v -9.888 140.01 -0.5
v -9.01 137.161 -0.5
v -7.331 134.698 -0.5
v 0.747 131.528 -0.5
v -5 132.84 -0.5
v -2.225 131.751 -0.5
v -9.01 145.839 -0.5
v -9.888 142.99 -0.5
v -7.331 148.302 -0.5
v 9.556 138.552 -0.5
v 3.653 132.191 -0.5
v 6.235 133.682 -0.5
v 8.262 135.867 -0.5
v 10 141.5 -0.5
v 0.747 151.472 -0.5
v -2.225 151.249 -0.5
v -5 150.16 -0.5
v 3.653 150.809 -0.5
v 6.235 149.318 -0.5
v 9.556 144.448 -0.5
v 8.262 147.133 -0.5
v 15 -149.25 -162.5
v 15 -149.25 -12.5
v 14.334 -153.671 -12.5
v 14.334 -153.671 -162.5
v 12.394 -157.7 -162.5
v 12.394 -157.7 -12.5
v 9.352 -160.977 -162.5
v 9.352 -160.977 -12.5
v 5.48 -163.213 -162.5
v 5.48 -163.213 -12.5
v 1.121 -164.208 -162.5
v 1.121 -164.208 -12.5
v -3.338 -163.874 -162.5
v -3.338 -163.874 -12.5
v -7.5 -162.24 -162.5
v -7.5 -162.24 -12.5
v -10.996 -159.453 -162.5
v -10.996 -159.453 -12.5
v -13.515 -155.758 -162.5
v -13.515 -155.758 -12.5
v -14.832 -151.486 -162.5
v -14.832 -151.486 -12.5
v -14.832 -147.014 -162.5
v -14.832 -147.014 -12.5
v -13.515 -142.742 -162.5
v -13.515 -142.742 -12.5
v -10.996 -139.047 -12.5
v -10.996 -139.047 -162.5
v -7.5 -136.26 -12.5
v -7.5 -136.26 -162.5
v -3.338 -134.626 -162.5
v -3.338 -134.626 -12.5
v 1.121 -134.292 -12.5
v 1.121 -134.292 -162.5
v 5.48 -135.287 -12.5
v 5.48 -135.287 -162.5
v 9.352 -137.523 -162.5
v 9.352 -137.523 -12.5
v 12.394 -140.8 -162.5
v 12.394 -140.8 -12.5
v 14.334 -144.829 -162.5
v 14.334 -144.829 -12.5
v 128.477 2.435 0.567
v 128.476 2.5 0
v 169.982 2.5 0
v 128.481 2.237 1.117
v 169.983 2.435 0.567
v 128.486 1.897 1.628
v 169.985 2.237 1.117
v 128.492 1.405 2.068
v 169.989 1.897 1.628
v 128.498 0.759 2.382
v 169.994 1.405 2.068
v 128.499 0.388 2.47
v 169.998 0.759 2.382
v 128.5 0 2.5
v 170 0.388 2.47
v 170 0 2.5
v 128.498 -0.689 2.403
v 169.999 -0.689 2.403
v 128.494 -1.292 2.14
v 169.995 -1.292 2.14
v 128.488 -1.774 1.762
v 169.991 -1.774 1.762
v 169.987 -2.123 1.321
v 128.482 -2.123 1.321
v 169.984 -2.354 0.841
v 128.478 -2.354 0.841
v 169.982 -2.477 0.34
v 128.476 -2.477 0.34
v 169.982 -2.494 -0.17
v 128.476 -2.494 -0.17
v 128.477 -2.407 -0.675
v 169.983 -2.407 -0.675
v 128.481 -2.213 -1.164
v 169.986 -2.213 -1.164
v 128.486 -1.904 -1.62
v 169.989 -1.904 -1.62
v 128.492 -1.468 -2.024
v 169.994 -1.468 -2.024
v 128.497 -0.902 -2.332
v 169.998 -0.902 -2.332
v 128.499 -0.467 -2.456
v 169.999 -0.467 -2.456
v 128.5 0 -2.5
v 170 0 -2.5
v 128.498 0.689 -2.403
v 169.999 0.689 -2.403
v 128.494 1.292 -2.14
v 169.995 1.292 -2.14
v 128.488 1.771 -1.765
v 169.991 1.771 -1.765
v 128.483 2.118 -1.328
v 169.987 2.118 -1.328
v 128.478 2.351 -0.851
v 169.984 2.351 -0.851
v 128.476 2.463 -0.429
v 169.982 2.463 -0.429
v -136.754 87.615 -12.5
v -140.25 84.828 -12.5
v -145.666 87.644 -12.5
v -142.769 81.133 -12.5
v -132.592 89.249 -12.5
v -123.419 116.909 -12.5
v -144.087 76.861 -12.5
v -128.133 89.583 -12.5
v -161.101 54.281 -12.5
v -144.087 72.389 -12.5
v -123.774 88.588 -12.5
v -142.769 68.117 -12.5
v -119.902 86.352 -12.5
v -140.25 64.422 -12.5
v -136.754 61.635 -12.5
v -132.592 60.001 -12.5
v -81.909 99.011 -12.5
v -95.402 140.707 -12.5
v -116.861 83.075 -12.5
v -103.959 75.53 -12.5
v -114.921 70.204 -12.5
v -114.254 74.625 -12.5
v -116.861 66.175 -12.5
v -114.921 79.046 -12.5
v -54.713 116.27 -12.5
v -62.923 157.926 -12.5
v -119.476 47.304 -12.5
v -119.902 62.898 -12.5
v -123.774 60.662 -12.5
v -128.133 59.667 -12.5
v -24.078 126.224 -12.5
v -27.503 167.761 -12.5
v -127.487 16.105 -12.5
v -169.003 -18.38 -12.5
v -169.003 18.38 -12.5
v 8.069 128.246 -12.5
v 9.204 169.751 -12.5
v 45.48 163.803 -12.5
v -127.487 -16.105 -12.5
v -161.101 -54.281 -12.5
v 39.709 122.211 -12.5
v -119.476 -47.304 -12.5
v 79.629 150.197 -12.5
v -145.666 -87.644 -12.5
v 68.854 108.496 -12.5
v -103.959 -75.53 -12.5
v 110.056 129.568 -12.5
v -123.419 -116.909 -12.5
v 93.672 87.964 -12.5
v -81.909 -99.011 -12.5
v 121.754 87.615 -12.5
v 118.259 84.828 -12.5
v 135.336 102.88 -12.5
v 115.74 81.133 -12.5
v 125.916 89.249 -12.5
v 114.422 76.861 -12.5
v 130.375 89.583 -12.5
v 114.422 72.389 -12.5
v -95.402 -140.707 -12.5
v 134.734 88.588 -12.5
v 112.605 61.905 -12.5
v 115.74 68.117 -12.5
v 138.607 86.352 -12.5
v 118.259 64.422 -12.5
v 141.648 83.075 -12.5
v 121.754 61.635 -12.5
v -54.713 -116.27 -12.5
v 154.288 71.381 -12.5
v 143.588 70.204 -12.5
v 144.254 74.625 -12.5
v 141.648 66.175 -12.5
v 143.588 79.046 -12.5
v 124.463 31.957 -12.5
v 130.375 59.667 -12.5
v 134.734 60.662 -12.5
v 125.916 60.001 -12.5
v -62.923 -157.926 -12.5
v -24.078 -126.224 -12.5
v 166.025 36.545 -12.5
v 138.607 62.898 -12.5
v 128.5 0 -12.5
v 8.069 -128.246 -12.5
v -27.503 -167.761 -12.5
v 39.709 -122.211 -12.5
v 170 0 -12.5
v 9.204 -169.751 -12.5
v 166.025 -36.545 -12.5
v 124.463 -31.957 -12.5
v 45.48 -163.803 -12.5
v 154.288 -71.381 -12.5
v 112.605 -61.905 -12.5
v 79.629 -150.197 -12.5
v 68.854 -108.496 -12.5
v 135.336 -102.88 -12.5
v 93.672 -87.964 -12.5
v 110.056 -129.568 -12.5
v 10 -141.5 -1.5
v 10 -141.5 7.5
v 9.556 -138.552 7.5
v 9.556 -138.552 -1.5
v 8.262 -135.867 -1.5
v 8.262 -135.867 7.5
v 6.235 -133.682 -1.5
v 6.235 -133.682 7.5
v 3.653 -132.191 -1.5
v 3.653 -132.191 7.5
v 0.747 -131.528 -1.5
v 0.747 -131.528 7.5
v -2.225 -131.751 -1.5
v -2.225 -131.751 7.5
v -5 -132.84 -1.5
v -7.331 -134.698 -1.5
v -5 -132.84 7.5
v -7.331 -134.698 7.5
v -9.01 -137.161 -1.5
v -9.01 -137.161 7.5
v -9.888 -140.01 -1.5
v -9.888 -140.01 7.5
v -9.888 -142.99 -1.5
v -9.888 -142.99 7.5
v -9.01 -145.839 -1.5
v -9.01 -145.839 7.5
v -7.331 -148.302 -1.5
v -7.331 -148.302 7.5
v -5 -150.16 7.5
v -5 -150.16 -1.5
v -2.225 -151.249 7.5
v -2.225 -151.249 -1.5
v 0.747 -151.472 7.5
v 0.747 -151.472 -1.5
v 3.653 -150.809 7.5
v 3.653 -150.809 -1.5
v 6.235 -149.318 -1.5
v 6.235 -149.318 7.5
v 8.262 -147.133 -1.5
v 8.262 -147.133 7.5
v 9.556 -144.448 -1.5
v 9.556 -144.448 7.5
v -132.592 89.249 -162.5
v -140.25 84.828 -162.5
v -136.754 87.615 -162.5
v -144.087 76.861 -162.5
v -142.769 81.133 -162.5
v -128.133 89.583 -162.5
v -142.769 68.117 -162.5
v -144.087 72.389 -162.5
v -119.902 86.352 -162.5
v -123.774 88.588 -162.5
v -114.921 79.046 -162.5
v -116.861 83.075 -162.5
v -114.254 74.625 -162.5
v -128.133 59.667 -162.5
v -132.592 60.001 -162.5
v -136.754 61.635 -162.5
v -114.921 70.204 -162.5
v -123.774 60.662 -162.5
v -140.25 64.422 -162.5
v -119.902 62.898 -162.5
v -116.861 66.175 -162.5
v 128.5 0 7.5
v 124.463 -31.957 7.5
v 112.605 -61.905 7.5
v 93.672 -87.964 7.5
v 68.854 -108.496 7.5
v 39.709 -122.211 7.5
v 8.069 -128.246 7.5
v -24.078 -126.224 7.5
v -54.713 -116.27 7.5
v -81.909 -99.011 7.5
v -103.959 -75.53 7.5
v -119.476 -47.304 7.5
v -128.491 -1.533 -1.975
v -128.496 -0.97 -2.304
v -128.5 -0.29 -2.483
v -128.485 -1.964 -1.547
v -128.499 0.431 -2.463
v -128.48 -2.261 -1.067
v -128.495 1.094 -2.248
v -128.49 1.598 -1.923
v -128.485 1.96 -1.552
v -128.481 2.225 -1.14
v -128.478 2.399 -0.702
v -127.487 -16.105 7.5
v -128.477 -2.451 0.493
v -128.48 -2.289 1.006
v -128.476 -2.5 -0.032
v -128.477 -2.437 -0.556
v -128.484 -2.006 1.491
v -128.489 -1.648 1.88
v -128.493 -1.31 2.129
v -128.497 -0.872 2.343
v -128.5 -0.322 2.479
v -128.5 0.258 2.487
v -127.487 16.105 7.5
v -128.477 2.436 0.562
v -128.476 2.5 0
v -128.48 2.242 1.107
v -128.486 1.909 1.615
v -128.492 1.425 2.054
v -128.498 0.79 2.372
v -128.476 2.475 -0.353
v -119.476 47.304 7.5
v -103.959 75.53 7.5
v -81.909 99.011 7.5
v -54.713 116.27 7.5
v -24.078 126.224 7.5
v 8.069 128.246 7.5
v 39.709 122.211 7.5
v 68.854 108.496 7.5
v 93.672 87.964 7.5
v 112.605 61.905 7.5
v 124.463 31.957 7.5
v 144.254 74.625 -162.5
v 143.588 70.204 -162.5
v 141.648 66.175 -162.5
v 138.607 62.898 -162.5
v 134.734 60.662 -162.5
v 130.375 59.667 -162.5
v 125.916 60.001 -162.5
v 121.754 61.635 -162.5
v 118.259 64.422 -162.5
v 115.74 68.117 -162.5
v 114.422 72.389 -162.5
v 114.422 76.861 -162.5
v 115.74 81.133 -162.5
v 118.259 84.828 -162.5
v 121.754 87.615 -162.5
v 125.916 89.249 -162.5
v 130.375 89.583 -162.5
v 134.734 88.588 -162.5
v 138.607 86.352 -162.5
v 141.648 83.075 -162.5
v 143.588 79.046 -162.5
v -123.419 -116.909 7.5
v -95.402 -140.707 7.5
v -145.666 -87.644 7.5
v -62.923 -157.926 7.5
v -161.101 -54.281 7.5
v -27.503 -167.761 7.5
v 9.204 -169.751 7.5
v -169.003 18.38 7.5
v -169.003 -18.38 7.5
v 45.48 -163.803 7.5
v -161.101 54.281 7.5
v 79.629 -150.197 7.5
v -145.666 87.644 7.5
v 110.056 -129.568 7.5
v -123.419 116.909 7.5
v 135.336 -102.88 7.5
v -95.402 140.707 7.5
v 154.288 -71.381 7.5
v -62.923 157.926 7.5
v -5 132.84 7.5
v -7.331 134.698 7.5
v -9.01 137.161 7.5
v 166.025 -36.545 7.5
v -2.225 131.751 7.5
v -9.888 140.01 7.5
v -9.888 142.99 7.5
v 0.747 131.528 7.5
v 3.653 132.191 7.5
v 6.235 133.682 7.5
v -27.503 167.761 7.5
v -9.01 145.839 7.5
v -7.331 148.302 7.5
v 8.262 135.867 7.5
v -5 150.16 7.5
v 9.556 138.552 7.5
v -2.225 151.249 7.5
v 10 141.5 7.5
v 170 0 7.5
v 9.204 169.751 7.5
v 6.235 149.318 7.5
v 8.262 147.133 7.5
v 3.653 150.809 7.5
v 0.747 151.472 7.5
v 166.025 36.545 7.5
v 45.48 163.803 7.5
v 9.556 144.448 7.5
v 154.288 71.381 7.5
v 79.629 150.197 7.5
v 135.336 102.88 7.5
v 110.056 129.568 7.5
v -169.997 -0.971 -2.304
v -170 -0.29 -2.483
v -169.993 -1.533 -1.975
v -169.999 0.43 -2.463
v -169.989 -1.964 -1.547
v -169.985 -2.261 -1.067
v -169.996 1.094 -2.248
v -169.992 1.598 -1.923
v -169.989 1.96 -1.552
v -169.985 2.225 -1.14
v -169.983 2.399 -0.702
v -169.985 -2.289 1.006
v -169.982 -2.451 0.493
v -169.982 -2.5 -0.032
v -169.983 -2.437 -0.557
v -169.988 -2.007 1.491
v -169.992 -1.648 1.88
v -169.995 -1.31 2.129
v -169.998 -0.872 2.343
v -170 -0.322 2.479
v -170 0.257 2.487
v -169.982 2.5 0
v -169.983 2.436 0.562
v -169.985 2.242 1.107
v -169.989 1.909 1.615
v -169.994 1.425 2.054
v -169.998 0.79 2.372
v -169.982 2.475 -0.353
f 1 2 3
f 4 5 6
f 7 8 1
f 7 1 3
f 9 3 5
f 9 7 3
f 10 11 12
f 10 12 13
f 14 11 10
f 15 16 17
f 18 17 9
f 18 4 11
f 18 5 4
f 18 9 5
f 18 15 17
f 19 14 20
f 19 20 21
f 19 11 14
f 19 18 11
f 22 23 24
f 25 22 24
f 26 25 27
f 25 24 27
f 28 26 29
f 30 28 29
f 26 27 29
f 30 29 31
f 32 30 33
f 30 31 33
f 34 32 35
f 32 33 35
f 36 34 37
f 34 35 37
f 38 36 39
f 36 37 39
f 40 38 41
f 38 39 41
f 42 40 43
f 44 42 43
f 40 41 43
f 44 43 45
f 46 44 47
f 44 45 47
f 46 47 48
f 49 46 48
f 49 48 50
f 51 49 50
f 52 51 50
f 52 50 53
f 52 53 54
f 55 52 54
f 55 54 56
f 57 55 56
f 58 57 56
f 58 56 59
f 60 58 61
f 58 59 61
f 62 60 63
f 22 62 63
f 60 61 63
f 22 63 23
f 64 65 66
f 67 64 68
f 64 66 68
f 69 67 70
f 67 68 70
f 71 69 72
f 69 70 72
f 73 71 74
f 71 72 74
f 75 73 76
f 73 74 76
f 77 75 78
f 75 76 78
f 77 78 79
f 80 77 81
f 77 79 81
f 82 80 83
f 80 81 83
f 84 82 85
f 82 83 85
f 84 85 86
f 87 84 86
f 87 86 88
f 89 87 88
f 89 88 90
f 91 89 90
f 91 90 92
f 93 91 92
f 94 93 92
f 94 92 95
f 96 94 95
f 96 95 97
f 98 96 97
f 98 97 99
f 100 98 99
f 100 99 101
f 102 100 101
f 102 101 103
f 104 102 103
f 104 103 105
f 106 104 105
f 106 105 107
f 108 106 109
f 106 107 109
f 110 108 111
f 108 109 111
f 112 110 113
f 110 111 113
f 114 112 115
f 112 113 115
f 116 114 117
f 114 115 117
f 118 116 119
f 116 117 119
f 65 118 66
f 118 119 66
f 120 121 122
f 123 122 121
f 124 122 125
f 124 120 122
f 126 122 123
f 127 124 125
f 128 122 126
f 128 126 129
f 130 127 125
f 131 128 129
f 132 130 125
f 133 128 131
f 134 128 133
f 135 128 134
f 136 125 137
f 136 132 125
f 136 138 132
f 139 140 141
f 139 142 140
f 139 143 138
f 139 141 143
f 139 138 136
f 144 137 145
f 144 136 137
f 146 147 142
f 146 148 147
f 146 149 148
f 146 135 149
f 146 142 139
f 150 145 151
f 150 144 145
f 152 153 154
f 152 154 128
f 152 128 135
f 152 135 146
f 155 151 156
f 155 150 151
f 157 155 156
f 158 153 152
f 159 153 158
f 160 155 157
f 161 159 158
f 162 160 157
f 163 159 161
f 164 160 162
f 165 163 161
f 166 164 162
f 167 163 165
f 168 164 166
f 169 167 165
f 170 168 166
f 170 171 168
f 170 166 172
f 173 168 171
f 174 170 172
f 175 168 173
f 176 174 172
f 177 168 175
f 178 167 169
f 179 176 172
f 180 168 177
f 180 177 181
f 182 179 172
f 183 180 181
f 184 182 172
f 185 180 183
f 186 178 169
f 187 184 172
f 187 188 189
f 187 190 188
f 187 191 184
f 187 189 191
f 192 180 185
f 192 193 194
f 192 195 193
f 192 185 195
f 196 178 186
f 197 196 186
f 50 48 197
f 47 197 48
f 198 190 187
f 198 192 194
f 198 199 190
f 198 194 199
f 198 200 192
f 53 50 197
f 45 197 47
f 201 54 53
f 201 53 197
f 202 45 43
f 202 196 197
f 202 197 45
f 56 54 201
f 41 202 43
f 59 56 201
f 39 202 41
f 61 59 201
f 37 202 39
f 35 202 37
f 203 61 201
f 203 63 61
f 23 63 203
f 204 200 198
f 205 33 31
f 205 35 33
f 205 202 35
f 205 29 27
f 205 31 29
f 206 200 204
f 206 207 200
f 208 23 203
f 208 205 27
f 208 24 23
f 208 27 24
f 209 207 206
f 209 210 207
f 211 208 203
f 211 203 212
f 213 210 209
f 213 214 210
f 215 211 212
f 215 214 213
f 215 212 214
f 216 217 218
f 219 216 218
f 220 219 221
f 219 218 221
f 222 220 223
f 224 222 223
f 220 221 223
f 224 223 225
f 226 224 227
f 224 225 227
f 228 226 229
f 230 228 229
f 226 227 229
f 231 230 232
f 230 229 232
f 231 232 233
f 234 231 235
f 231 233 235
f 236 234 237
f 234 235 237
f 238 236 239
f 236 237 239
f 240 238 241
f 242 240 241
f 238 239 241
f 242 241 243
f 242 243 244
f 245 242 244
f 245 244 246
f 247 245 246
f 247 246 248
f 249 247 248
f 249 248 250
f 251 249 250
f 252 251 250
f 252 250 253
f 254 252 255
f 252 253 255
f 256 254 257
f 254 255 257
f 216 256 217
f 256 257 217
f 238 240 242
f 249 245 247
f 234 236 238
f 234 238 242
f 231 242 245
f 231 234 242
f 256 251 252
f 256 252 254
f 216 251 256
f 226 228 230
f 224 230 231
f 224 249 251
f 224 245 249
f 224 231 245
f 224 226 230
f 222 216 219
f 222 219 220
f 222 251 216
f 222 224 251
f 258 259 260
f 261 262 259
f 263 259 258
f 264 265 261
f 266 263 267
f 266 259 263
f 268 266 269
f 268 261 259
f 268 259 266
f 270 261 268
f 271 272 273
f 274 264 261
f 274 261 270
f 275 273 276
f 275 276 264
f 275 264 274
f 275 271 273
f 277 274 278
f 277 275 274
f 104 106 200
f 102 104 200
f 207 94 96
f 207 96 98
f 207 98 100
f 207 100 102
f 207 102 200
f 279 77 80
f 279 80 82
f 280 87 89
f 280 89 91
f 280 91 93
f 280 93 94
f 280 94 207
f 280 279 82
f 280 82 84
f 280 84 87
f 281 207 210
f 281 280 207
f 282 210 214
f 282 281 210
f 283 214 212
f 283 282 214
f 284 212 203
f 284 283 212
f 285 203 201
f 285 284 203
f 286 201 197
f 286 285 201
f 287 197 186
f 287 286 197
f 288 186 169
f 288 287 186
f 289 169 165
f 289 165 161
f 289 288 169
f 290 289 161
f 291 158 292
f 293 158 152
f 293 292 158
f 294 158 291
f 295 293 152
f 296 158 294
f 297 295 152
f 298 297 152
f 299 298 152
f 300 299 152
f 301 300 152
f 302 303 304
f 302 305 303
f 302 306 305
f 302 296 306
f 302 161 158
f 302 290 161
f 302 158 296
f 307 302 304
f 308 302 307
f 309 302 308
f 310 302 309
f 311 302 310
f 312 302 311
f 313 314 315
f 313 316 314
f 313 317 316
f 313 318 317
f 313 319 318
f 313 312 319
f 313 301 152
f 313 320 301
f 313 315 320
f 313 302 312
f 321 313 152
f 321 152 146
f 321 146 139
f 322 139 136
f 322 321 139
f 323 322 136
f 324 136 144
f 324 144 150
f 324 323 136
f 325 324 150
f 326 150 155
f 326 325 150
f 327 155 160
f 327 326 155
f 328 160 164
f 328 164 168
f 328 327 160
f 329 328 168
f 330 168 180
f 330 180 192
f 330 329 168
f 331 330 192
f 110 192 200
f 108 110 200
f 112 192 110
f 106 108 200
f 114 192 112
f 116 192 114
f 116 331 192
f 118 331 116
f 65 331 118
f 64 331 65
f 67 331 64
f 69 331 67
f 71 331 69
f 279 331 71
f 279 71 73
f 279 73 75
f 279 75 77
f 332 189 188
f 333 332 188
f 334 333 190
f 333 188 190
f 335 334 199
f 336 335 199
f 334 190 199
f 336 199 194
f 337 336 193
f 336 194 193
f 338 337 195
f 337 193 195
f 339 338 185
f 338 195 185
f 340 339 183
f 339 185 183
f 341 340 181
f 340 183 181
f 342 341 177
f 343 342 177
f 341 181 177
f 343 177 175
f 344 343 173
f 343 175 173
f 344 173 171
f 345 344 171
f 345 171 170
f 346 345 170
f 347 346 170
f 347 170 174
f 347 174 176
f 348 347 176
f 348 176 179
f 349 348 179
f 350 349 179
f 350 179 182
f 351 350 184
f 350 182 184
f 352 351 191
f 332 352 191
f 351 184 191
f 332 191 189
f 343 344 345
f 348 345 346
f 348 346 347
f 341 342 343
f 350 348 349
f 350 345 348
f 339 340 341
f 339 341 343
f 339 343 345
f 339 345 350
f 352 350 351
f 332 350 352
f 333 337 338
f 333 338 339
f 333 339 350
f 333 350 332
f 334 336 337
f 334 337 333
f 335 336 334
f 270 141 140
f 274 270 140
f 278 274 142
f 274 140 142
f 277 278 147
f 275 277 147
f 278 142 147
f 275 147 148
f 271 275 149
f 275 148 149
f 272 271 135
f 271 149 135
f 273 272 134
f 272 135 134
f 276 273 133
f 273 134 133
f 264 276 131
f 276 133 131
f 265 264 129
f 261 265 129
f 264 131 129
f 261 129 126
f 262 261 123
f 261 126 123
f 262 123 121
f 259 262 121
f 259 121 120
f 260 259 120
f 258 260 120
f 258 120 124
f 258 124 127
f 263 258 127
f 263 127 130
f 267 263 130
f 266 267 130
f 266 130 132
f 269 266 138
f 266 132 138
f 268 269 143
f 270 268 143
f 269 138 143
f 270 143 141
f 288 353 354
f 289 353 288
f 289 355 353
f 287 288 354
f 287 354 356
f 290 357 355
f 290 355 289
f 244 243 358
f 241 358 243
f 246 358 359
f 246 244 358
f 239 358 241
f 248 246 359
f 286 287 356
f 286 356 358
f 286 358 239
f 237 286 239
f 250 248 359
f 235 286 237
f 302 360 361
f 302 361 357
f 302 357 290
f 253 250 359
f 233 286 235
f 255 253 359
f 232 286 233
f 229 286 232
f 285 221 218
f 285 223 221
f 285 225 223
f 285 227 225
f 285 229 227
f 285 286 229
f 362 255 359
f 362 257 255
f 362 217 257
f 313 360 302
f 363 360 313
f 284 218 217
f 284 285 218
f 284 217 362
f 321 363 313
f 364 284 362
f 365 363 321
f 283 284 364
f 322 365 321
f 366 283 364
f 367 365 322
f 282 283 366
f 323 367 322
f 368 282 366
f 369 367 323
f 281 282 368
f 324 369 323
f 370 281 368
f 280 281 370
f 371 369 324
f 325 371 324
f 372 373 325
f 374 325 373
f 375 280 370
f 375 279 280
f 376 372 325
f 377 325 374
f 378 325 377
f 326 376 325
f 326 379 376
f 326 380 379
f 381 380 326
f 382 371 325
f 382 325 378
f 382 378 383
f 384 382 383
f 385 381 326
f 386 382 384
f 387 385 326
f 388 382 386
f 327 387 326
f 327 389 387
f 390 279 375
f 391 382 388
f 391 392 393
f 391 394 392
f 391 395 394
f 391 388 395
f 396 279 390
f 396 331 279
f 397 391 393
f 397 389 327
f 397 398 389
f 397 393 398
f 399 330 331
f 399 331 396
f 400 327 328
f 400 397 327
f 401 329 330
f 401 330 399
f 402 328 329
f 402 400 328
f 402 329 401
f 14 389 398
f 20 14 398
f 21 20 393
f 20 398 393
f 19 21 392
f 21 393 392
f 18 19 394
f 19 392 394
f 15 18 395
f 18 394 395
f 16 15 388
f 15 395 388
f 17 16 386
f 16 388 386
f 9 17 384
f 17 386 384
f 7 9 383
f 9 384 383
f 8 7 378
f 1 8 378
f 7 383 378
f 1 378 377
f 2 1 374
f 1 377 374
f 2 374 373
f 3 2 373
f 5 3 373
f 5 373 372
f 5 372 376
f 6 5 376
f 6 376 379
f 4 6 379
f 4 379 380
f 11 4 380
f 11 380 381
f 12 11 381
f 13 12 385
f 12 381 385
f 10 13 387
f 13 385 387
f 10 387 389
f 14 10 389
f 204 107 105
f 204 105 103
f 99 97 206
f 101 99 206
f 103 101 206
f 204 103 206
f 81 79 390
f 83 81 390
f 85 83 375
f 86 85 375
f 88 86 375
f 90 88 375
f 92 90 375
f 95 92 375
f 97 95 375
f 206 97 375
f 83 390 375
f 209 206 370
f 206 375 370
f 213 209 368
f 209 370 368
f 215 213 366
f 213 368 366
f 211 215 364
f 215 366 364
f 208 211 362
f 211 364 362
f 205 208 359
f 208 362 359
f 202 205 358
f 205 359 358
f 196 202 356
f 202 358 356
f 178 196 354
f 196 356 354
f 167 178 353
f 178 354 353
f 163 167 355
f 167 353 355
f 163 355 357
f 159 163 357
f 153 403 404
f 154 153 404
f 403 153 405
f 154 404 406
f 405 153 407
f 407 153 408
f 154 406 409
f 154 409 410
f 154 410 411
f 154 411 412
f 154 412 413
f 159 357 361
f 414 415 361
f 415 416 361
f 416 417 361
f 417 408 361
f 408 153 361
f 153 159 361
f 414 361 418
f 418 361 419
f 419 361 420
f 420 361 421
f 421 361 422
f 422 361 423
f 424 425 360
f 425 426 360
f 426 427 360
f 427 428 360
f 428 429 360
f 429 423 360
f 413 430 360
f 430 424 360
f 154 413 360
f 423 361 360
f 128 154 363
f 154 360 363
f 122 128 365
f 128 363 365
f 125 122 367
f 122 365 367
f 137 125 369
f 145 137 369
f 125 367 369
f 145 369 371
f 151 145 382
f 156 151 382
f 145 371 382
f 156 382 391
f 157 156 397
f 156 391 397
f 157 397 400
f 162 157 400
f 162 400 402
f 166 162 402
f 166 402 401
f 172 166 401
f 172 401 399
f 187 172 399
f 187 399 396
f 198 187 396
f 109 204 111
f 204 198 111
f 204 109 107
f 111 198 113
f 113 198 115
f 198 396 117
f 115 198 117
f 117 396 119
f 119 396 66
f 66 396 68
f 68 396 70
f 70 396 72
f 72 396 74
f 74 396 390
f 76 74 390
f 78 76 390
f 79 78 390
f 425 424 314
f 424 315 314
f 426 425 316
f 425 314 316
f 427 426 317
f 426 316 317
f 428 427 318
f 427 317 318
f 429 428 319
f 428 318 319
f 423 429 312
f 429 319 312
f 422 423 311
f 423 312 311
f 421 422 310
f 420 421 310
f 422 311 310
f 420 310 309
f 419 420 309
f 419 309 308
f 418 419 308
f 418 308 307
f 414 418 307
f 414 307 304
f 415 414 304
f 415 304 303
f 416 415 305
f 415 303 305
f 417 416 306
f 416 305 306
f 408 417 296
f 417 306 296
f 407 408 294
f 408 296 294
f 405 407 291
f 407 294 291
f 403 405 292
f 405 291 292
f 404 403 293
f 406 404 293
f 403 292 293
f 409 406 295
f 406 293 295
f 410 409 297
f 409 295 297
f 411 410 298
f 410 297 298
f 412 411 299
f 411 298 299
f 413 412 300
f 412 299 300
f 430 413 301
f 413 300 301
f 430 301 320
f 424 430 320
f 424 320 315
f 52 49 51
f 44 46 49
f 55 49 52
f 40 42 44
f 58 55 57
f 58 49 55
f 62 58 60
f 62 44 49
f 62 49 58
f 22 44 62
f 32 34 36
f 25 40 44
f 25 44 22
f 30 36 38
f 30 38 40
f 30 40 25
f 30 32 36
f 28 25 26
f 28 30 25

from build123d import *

# Parameters (mm, degrees)
F0_R        = 170
F0_R_2      = 128.5
F1_DEPTH    = 7.5
F1_FACE_R   = 170
F1_FACE_R_2 = 128.5
F2_DEPTH    = 12.5
F3_R        = 15
F4_DEPTH    = 150
F5_R        = 10
F6_DEPTH    = 8
F7_DEPTH    = 9
F8_W        = 515.232772
F8_H        = 2.5


with BuildPart() as f1:
    # F0 (on Top) → F1 (new body)
    with BuildSketch(Plane.XY):
        Circle(F0_R)
        Circle(F0_R_2, mode=Mode.SUBTRACT)
    extrude(amount=F1_DEPTH)

    # F1_face (on face) → F2 (join)
    with BuildSketch(Plane(origin=(0, 0, 0), x_dir=(1, 0, 0), z_dir=(0, 0, -1))):
        Circle(F1_FACE_R)
        Circle(F1_FACE_R_2, mode=Mode.SUBTRACT)
    extrude(amount=F2_DEPTH)

    # F3 (on face) → F4 (join)
    with BuildSketch(Plane(origin=(0, 0, -12.5), x_dir=(1, 0, 0), z_dir=(0, 0, -1))):
        with Locations((0, 149.25)):
            Circle(F3_R)
        with Locations((129.254292, -74.625)):
            Circle(F3_R)
        with Locations((-129.254292, -74.625)):
            Circle(F3_R)
    extrude(amount=F4_DEPTH)

    # F5 (on face) → F6 (cut)
    with BuildSketch(Plane.XY.offset(7.5)):
        with Locations((0, 141.5)):
            Circle(F5_R)
    extrude(amount=-F6_DEPTH, mode=Mode.SUBTRACT)

    # F5 (on face) → F7 (cut)
    with BuildSketch(Plane.XY.offset(7.5)):
        with Locations((0, -141.5)):
            Circle(F5_R)
    extrude(amount=-F7_DEPTH, mode=Mode.SUBTRACT)

    # F8 (on Top) → F9 (revolve, cut)
    with BuildSketch(Plane.XY):
        with Locations((21.541521, 1.25)):
            Rectangle(F8_W, F8_H)
    revolve(axis=Axis((21.541521, 0, 0), (1, 0, 0)), mode=Mode.SUBTRACT)


solid = f1.part
